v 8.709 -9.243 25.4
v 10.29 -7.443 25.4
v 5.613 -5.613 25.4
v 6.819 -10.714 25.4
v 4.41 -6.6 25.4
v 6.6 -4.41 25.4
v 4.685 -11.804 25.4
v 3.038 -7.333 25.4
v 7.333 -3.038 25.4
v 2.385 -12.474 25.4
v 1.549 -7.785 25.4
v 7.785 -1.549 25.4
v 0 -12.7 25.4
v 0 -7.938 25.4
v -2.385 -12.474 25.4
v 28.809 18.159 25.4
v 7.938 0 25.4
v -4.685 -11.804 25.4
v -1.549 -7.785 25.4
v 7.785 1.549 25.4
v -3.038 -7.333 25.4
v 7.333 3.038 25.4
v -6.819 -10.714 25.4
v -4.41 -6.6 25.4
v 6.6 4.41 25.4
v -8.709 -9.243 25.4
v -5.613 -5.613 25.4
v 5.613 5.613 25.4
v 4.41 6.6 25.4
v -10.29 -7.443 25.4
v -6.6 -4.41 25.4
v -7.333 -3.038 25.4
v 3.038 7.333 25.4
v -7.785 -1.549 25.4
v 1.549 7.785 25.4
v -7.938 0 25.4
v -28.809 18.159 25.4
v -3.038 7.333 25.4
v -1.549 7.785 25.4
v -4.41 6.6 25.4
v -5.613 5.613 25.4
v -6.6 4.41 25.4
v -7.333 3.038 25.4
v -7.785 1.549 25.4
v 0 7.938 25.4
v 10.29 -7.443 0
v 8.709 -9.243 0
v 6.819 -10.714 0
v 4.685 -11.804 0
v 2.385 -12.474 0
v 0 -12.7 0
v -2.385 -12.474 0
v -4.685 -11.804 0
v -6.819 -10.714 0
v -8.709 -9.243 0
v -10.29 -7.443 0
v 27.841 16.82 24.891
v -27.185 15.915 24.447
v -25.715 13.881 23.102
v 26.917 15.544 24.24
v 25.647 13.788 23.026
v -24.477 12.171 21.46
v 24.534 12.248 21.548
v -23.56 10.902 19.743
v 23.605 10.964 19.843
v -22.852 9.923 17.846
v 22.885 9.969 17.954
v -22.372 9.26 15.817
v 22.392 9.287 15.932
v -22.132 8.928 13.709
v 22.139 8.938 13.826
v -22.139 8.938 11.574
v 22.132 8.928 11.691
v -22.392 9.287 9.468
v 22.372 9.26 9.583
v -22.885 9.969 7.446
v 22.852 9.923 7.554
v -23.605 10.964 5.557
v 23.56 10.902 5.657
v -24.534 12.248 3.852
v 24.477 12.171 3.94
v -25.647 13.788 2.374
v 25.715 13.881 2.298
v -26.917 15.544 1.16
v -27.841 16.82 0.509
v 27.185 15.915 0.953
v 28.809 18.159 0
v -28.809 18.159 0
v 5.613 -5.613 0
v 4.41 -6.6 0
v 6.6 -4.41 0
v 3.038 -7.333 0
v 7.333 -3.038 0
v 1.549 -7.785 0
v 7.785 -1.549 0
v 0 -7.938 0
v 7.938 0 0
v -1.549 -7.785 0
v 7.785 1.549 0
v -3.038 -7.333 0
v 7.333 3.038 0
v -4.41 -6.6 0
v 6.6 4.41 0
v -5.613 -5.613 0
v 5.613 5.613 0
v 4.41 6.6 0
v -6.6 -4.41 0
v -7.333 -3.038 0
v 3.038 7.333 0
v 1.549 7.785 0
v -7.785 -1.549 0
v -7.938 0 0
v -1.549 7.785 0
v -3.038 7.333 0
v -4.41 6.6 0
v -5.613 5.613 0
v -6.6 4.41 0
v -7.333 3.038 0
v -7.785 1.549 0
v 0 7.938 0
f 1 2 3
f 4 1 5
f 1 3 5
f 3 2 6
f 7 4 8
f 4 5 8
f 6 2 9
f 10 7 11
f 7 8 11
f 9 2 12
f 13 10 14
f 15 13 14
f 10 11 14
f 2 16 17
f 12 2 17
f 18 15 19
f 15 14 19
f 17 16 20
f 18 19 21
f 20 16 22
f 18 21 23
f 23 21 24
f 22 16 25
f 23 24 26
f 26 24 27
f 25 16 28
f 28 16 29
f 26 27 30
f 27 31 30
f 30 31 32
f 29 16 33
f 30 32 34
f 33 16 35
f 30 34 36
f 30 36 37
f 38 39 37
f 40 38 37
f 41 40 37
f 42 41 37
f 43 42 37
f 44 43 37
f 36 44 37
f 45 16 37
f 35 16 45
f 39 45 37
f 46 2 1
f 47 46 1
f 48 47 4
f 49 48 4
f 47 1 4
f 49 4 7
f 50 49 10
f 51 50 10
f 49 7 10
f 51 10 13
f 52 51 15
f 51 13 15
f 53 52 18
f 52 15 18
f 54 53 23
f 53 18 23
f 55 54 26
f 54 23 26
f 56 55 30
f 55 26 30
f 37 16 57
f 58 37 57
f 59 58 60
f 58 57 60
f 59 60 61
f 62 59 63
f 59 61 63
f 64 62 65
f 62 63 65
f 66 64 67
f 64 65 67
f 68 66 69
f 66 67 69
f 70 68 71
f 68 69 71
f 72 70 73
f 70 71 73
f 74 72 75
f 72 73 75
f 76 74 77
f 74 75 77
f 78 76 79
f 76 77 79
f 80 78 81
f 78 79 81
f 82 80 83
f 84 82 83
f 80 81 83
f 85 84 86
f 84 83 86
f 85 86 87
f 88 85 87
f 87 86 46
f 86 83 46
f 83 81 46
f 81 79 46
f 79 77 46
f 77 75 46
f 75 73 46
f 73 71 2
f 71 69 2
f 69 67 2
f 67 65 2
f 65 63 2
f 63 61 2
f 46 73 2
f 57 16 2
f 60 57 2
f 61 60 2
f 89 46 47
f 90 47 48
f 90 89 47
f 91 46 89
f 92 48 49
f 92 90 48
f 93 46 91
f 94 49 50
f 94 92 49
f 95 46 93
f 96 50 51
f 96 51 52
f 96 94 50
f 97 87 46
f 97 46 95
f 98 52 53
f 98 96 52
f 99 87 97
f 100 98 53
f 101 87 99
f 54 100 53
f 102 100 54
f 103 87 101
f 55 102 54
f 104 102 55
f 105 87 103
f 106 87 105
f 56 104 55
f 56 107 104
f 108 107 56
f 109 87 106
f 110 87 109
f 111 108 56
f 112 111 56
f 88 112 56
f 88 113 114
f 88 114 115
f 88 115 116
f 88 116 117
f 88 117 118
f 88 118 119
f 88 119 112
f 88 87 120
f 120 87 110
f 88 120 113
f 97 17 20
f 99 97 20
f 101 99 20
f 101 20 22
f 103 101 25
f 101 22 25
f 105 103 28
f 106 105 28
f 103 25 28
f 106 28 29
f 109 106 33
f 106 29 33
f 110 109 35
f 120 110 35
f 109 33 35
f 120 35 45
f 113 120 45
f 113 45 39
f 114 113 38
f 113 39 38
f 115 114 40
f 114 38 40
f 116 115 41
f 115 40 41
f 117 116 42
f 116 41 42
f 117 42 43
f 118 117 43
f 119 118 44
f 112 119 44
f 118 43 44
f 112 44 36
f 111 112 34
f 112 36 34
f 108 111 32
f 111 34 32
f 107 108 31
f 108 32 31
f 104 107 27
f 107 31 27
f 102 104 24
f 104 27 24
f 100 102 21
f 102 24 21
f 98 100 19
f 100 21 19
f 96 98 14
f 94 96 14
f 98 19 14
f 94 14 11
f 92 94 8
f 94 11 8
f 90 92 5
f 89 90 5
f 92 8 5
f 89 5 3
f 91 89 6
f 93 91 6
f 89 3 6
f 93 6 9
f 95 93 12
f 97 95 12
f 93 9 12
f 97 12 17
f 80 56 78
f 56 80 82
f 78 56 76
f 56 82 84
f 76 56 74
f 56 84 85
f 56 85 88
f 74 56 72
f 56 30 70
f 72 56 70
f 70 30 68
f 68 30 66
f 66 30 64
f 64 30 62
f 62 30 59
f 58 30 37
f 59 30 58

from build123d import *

# Parameters (mm, degrees)
EXTRUDE1_START = 25.4
SKETCH1_R      = 7.9375
EXTRUDE1_DEPTH = 25.4
SKETCH2_R      = 13.335
EXTRUDE3_DEPTH = 73.025


with BuildPart() as part:
    # Sketch1 → Extrude1 (new body)
    with BuildSketch(Plane.XY.offset(EXTRUDE1_START)):
        with BuildLine():
            Line((-10.290233655, -7.443190936), (-31.75, 22.225))
            Line((-31.75, 22.225), (31.75, 22.225))
            Line((31.75, 22.225), (10.290233655, -7.443190936))
            ThreePointArc((10.290233655, -7.443190936), (0, -12.7), (-10.290233655, -7.443190936))
        make_face()
        Circle(SKETCH1_R, mode=Mode.SUBTRACT)
    extrude(amount=-EXTRUDE1_DEPTH)

    # Sketch2 → Extrude3 (cut, symmetric)
    with BuildSketch(Plane(origin=(0, 0, 0), x_dir=(0, 0, -1), z_dir=(1, 0, 0))):
        with Locations((-12.7, 22.225)):
            Circle(SKETCH2_R)
    extrude(amount=EXTRUDE3_DEPTH, both=True, mode=Mode.SUBTRACT)


solid = part.part
